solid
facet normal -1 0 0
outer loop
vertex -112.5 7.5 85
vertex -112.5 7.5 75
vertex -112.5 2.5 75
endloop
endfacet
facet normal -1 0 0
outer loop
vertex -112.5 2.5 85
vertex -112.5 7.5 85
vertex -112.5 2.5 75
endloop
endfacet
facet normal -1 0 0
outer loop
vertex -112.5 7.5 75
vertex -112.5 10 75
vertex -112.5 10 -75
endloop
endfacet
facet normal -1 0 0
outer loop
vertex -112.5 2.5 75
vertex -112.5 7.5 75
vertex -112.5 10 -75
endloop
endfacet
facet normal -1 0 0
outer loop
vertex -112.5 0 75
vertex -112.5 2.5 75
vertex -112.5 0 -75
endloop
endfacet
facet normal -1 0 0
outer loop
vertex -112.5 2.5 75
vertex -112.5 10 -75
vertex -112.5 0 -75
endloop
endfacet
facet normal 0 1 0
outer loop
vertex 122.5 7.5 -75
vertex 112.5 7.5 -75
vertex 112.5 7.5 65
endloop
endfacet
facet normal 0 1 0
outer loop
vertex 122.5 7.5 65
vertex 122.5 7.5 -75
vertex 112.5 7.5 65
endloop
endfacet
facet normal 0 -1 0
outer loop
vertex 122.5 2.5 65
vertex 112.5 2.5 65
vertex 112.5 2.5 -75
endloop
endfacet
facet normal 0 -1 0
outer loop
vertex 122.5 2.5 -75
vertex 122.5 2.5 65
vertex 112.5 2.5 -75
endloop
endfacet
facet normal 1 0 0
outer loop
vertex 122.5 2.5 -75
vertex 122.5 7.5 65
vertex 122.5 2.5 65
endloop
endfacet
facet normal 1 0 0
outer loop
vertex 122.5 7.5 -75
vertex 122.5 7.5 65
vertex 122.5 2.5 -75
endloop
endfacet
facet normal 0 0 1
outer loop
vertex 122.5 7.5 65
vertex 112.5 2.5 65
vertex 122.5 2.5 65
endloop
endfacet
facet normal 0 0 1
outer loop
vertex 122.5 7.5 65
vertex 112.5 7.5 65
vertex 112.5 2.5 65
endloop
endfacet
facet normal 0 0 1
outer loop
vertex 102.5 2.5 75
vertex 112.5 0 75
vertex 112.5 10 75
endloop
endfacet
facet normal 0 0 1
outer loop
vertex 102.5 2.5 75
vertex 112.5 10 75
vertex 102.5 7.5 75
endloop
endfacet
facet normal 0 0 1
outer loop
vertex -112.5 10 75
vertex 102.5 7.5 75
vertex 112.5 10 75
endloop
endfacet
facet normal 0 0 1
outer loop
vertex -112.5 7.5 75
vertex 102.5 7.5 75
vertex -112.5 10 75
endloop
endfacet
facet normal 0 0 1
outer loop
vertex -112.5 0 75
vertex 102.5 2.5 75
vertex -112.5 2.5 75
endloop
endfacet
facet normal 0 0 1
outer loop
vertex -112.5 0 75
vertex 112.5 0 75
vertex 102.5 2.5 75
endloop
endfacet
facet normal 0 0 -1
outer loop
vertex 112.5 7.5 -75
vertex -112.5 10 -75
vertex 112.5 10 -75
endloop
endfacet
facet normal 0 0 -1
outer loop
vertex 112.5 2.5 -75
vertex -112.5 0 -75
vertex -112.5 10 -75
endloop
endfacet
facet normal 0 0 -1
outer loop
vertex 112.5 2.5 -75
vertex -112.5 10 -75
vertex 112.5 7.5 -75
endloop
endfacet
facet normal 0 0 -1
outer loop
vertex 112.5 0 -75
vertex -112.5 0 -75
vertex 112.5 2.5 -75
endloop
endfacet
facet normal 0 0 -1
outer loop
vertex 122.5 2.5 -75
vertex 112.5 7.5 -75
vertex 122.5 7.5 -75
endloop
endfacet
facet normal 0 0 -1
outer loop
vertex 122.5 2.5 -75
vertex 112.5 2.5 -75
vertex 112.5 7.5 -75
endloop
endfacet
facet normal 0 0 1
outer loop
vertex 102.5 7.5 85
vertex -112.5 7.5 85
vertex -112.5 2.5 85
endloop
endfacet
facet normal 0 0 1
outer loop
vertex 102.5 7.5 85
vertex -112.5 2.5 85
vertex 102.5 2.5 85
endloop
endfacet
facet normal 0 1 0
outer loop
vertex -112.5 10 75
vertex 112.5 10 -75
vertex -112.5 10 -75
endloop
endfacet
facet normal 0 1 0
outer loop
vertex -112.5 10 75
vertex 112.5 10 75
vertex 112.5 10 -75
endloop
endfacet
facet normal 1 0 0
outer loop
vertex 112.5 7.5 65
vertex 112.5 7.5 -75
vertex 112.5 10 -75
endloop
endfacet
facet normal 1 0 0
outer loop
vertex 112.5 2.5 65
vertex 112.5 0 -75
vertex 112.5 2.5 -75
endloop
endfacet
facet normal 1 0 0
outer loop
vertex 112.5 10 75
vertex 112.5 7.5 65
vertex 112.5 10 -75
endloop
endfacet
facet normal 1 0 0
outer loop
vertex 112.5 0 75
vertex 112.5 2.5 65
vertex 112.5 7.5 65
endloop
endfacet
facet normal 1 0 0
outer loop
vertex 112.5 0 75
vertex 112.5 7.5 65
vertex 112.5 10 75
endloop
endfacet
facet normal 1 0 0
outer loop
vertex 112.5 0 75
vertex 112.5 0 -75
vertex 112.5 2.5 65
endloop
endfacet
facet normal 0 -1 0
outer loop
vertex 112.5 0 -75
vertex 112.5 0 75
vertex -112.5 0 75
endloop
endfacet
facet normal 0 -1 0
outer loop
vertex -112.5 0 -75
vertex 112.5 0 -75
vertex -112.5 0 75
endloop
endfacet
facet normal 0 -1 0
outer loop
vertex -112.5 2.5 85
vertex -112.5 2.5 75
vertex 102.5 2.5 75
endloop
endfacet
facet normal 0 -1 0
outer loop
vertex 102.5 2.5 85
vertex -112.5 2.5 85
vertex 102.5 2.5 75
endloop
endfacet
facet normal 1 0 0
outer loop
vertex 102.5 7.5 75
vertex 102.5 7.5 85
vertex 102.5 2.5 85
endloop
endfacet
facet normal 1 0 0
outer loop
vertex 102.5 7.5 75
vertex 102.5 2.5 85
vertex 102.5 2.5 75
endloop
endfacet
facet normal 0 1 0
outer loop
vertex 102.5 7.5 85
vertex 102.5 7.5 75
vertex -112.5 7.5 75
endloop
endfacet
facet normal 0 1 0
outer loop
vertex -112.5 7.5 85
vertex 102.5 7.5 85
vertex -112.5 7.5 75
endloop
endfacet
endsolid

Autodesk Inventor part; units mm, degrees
ref_plane "YZ Plane" through (0, 0, 0) normal (1, 0, 0) x (0, 1, 0)
ref_plane "XZ Plane" through (0, 0, 0) normal (0, 1, 0) x (-1, 0, 0)
ref_plane "XY Plane" through (0, 0, 0) normal (0, 0, 1) x (1, 0, 0)
sketch "Sketch1" plane through (0, 0, 0) normal (0, 1, 0) x (-1, 0, 0)
  line L0 (-112.5, 75) -> (112.5, 75)
  line L1 (112.5, 75) -> (112.5, -75)
  line L2 (112.5, -75) -> (-112.5, -75)
  line L3 (-112.5, -75) -> (-112.5, 75)
  line L4 (-112.5, 75) -> (112.5, -75) construction
  line L5 (112.5, 75) -> (-112.5, -75) construction
  point P0 (0, 0)
  dimension "d0" = 225
  dimension "d1" = 150
extrude "Extrusion1" add sketch "Sketch1" along normal blind 10
sketch "Sketch2" plane through (112.5, 0, 75) normal (1, 0, 0) x (0, 0, -1)
  line L0 (0, 2.5) -> (150, 2.5)
  line L1 (150, 2.5) -> (150, 7.5)
  line L2 (150, 7.5) -> (0, 7.5)
  line L3 (0, 7.5) -> (0, 2.5)
  point P0 (75, 0)
  point P1 (0, 5)
  dimension "d4" = 150
  dimension "d5" = 5
extrude "Extrusion2" add sketch "Sketch2" along normal blind 10
sketch "Sketch3" plane through (-112.5, 0, 75) normal (0, 0, 1) x (1, 0, 0)
  line L0 (0, 2.5) -> (225, 2.5)
  line L1 (225, 2.5) -> (225, 7.5)
  line L2 (225, 7.5) -> (0, 7.5)
  line L3 (0, 7.5) -> (0, 2.5)
  point P0 (112.5, 0)
  dimension "d8" = 225
  dimension "d9" = 5
extrude "Extrusion3" add sketch "Sketch3" along normal blind 10
sketch "Sketch4" plane through (-112.5, 7.5, 75) normal (0, 1, 0) x (1, 0, 0)
  line L0 (0, -10) -> (225, -10) projected
  line L1 (225, -10) -> (215, -10)
  line L2 (215, -10) -> (215, 0)
  line L3 (215, 0) -> (225, 0)
  line L4 (225, 0) -> (225, -10)
  line L5 (235, 150) -> (235, 0) projected
  line L6 (235, 0) -> (225, 0)
  line L7 (225, 0) -> (225, 10)
  line L8 (225, 10) -> (235, 10)
  line L9 (235, 10) -> (235, 0)
  point P0 (112.5, 75)
  dimension "d12" = 10
  dimension "d13" = 10
  dimension "d14" = 10
  dimension "d15" = 10
extrude "Extrusion4" cut sketch "Sketch4" against normal blind 10
properties part number "TSU_Baseplate_Male_Cut"
